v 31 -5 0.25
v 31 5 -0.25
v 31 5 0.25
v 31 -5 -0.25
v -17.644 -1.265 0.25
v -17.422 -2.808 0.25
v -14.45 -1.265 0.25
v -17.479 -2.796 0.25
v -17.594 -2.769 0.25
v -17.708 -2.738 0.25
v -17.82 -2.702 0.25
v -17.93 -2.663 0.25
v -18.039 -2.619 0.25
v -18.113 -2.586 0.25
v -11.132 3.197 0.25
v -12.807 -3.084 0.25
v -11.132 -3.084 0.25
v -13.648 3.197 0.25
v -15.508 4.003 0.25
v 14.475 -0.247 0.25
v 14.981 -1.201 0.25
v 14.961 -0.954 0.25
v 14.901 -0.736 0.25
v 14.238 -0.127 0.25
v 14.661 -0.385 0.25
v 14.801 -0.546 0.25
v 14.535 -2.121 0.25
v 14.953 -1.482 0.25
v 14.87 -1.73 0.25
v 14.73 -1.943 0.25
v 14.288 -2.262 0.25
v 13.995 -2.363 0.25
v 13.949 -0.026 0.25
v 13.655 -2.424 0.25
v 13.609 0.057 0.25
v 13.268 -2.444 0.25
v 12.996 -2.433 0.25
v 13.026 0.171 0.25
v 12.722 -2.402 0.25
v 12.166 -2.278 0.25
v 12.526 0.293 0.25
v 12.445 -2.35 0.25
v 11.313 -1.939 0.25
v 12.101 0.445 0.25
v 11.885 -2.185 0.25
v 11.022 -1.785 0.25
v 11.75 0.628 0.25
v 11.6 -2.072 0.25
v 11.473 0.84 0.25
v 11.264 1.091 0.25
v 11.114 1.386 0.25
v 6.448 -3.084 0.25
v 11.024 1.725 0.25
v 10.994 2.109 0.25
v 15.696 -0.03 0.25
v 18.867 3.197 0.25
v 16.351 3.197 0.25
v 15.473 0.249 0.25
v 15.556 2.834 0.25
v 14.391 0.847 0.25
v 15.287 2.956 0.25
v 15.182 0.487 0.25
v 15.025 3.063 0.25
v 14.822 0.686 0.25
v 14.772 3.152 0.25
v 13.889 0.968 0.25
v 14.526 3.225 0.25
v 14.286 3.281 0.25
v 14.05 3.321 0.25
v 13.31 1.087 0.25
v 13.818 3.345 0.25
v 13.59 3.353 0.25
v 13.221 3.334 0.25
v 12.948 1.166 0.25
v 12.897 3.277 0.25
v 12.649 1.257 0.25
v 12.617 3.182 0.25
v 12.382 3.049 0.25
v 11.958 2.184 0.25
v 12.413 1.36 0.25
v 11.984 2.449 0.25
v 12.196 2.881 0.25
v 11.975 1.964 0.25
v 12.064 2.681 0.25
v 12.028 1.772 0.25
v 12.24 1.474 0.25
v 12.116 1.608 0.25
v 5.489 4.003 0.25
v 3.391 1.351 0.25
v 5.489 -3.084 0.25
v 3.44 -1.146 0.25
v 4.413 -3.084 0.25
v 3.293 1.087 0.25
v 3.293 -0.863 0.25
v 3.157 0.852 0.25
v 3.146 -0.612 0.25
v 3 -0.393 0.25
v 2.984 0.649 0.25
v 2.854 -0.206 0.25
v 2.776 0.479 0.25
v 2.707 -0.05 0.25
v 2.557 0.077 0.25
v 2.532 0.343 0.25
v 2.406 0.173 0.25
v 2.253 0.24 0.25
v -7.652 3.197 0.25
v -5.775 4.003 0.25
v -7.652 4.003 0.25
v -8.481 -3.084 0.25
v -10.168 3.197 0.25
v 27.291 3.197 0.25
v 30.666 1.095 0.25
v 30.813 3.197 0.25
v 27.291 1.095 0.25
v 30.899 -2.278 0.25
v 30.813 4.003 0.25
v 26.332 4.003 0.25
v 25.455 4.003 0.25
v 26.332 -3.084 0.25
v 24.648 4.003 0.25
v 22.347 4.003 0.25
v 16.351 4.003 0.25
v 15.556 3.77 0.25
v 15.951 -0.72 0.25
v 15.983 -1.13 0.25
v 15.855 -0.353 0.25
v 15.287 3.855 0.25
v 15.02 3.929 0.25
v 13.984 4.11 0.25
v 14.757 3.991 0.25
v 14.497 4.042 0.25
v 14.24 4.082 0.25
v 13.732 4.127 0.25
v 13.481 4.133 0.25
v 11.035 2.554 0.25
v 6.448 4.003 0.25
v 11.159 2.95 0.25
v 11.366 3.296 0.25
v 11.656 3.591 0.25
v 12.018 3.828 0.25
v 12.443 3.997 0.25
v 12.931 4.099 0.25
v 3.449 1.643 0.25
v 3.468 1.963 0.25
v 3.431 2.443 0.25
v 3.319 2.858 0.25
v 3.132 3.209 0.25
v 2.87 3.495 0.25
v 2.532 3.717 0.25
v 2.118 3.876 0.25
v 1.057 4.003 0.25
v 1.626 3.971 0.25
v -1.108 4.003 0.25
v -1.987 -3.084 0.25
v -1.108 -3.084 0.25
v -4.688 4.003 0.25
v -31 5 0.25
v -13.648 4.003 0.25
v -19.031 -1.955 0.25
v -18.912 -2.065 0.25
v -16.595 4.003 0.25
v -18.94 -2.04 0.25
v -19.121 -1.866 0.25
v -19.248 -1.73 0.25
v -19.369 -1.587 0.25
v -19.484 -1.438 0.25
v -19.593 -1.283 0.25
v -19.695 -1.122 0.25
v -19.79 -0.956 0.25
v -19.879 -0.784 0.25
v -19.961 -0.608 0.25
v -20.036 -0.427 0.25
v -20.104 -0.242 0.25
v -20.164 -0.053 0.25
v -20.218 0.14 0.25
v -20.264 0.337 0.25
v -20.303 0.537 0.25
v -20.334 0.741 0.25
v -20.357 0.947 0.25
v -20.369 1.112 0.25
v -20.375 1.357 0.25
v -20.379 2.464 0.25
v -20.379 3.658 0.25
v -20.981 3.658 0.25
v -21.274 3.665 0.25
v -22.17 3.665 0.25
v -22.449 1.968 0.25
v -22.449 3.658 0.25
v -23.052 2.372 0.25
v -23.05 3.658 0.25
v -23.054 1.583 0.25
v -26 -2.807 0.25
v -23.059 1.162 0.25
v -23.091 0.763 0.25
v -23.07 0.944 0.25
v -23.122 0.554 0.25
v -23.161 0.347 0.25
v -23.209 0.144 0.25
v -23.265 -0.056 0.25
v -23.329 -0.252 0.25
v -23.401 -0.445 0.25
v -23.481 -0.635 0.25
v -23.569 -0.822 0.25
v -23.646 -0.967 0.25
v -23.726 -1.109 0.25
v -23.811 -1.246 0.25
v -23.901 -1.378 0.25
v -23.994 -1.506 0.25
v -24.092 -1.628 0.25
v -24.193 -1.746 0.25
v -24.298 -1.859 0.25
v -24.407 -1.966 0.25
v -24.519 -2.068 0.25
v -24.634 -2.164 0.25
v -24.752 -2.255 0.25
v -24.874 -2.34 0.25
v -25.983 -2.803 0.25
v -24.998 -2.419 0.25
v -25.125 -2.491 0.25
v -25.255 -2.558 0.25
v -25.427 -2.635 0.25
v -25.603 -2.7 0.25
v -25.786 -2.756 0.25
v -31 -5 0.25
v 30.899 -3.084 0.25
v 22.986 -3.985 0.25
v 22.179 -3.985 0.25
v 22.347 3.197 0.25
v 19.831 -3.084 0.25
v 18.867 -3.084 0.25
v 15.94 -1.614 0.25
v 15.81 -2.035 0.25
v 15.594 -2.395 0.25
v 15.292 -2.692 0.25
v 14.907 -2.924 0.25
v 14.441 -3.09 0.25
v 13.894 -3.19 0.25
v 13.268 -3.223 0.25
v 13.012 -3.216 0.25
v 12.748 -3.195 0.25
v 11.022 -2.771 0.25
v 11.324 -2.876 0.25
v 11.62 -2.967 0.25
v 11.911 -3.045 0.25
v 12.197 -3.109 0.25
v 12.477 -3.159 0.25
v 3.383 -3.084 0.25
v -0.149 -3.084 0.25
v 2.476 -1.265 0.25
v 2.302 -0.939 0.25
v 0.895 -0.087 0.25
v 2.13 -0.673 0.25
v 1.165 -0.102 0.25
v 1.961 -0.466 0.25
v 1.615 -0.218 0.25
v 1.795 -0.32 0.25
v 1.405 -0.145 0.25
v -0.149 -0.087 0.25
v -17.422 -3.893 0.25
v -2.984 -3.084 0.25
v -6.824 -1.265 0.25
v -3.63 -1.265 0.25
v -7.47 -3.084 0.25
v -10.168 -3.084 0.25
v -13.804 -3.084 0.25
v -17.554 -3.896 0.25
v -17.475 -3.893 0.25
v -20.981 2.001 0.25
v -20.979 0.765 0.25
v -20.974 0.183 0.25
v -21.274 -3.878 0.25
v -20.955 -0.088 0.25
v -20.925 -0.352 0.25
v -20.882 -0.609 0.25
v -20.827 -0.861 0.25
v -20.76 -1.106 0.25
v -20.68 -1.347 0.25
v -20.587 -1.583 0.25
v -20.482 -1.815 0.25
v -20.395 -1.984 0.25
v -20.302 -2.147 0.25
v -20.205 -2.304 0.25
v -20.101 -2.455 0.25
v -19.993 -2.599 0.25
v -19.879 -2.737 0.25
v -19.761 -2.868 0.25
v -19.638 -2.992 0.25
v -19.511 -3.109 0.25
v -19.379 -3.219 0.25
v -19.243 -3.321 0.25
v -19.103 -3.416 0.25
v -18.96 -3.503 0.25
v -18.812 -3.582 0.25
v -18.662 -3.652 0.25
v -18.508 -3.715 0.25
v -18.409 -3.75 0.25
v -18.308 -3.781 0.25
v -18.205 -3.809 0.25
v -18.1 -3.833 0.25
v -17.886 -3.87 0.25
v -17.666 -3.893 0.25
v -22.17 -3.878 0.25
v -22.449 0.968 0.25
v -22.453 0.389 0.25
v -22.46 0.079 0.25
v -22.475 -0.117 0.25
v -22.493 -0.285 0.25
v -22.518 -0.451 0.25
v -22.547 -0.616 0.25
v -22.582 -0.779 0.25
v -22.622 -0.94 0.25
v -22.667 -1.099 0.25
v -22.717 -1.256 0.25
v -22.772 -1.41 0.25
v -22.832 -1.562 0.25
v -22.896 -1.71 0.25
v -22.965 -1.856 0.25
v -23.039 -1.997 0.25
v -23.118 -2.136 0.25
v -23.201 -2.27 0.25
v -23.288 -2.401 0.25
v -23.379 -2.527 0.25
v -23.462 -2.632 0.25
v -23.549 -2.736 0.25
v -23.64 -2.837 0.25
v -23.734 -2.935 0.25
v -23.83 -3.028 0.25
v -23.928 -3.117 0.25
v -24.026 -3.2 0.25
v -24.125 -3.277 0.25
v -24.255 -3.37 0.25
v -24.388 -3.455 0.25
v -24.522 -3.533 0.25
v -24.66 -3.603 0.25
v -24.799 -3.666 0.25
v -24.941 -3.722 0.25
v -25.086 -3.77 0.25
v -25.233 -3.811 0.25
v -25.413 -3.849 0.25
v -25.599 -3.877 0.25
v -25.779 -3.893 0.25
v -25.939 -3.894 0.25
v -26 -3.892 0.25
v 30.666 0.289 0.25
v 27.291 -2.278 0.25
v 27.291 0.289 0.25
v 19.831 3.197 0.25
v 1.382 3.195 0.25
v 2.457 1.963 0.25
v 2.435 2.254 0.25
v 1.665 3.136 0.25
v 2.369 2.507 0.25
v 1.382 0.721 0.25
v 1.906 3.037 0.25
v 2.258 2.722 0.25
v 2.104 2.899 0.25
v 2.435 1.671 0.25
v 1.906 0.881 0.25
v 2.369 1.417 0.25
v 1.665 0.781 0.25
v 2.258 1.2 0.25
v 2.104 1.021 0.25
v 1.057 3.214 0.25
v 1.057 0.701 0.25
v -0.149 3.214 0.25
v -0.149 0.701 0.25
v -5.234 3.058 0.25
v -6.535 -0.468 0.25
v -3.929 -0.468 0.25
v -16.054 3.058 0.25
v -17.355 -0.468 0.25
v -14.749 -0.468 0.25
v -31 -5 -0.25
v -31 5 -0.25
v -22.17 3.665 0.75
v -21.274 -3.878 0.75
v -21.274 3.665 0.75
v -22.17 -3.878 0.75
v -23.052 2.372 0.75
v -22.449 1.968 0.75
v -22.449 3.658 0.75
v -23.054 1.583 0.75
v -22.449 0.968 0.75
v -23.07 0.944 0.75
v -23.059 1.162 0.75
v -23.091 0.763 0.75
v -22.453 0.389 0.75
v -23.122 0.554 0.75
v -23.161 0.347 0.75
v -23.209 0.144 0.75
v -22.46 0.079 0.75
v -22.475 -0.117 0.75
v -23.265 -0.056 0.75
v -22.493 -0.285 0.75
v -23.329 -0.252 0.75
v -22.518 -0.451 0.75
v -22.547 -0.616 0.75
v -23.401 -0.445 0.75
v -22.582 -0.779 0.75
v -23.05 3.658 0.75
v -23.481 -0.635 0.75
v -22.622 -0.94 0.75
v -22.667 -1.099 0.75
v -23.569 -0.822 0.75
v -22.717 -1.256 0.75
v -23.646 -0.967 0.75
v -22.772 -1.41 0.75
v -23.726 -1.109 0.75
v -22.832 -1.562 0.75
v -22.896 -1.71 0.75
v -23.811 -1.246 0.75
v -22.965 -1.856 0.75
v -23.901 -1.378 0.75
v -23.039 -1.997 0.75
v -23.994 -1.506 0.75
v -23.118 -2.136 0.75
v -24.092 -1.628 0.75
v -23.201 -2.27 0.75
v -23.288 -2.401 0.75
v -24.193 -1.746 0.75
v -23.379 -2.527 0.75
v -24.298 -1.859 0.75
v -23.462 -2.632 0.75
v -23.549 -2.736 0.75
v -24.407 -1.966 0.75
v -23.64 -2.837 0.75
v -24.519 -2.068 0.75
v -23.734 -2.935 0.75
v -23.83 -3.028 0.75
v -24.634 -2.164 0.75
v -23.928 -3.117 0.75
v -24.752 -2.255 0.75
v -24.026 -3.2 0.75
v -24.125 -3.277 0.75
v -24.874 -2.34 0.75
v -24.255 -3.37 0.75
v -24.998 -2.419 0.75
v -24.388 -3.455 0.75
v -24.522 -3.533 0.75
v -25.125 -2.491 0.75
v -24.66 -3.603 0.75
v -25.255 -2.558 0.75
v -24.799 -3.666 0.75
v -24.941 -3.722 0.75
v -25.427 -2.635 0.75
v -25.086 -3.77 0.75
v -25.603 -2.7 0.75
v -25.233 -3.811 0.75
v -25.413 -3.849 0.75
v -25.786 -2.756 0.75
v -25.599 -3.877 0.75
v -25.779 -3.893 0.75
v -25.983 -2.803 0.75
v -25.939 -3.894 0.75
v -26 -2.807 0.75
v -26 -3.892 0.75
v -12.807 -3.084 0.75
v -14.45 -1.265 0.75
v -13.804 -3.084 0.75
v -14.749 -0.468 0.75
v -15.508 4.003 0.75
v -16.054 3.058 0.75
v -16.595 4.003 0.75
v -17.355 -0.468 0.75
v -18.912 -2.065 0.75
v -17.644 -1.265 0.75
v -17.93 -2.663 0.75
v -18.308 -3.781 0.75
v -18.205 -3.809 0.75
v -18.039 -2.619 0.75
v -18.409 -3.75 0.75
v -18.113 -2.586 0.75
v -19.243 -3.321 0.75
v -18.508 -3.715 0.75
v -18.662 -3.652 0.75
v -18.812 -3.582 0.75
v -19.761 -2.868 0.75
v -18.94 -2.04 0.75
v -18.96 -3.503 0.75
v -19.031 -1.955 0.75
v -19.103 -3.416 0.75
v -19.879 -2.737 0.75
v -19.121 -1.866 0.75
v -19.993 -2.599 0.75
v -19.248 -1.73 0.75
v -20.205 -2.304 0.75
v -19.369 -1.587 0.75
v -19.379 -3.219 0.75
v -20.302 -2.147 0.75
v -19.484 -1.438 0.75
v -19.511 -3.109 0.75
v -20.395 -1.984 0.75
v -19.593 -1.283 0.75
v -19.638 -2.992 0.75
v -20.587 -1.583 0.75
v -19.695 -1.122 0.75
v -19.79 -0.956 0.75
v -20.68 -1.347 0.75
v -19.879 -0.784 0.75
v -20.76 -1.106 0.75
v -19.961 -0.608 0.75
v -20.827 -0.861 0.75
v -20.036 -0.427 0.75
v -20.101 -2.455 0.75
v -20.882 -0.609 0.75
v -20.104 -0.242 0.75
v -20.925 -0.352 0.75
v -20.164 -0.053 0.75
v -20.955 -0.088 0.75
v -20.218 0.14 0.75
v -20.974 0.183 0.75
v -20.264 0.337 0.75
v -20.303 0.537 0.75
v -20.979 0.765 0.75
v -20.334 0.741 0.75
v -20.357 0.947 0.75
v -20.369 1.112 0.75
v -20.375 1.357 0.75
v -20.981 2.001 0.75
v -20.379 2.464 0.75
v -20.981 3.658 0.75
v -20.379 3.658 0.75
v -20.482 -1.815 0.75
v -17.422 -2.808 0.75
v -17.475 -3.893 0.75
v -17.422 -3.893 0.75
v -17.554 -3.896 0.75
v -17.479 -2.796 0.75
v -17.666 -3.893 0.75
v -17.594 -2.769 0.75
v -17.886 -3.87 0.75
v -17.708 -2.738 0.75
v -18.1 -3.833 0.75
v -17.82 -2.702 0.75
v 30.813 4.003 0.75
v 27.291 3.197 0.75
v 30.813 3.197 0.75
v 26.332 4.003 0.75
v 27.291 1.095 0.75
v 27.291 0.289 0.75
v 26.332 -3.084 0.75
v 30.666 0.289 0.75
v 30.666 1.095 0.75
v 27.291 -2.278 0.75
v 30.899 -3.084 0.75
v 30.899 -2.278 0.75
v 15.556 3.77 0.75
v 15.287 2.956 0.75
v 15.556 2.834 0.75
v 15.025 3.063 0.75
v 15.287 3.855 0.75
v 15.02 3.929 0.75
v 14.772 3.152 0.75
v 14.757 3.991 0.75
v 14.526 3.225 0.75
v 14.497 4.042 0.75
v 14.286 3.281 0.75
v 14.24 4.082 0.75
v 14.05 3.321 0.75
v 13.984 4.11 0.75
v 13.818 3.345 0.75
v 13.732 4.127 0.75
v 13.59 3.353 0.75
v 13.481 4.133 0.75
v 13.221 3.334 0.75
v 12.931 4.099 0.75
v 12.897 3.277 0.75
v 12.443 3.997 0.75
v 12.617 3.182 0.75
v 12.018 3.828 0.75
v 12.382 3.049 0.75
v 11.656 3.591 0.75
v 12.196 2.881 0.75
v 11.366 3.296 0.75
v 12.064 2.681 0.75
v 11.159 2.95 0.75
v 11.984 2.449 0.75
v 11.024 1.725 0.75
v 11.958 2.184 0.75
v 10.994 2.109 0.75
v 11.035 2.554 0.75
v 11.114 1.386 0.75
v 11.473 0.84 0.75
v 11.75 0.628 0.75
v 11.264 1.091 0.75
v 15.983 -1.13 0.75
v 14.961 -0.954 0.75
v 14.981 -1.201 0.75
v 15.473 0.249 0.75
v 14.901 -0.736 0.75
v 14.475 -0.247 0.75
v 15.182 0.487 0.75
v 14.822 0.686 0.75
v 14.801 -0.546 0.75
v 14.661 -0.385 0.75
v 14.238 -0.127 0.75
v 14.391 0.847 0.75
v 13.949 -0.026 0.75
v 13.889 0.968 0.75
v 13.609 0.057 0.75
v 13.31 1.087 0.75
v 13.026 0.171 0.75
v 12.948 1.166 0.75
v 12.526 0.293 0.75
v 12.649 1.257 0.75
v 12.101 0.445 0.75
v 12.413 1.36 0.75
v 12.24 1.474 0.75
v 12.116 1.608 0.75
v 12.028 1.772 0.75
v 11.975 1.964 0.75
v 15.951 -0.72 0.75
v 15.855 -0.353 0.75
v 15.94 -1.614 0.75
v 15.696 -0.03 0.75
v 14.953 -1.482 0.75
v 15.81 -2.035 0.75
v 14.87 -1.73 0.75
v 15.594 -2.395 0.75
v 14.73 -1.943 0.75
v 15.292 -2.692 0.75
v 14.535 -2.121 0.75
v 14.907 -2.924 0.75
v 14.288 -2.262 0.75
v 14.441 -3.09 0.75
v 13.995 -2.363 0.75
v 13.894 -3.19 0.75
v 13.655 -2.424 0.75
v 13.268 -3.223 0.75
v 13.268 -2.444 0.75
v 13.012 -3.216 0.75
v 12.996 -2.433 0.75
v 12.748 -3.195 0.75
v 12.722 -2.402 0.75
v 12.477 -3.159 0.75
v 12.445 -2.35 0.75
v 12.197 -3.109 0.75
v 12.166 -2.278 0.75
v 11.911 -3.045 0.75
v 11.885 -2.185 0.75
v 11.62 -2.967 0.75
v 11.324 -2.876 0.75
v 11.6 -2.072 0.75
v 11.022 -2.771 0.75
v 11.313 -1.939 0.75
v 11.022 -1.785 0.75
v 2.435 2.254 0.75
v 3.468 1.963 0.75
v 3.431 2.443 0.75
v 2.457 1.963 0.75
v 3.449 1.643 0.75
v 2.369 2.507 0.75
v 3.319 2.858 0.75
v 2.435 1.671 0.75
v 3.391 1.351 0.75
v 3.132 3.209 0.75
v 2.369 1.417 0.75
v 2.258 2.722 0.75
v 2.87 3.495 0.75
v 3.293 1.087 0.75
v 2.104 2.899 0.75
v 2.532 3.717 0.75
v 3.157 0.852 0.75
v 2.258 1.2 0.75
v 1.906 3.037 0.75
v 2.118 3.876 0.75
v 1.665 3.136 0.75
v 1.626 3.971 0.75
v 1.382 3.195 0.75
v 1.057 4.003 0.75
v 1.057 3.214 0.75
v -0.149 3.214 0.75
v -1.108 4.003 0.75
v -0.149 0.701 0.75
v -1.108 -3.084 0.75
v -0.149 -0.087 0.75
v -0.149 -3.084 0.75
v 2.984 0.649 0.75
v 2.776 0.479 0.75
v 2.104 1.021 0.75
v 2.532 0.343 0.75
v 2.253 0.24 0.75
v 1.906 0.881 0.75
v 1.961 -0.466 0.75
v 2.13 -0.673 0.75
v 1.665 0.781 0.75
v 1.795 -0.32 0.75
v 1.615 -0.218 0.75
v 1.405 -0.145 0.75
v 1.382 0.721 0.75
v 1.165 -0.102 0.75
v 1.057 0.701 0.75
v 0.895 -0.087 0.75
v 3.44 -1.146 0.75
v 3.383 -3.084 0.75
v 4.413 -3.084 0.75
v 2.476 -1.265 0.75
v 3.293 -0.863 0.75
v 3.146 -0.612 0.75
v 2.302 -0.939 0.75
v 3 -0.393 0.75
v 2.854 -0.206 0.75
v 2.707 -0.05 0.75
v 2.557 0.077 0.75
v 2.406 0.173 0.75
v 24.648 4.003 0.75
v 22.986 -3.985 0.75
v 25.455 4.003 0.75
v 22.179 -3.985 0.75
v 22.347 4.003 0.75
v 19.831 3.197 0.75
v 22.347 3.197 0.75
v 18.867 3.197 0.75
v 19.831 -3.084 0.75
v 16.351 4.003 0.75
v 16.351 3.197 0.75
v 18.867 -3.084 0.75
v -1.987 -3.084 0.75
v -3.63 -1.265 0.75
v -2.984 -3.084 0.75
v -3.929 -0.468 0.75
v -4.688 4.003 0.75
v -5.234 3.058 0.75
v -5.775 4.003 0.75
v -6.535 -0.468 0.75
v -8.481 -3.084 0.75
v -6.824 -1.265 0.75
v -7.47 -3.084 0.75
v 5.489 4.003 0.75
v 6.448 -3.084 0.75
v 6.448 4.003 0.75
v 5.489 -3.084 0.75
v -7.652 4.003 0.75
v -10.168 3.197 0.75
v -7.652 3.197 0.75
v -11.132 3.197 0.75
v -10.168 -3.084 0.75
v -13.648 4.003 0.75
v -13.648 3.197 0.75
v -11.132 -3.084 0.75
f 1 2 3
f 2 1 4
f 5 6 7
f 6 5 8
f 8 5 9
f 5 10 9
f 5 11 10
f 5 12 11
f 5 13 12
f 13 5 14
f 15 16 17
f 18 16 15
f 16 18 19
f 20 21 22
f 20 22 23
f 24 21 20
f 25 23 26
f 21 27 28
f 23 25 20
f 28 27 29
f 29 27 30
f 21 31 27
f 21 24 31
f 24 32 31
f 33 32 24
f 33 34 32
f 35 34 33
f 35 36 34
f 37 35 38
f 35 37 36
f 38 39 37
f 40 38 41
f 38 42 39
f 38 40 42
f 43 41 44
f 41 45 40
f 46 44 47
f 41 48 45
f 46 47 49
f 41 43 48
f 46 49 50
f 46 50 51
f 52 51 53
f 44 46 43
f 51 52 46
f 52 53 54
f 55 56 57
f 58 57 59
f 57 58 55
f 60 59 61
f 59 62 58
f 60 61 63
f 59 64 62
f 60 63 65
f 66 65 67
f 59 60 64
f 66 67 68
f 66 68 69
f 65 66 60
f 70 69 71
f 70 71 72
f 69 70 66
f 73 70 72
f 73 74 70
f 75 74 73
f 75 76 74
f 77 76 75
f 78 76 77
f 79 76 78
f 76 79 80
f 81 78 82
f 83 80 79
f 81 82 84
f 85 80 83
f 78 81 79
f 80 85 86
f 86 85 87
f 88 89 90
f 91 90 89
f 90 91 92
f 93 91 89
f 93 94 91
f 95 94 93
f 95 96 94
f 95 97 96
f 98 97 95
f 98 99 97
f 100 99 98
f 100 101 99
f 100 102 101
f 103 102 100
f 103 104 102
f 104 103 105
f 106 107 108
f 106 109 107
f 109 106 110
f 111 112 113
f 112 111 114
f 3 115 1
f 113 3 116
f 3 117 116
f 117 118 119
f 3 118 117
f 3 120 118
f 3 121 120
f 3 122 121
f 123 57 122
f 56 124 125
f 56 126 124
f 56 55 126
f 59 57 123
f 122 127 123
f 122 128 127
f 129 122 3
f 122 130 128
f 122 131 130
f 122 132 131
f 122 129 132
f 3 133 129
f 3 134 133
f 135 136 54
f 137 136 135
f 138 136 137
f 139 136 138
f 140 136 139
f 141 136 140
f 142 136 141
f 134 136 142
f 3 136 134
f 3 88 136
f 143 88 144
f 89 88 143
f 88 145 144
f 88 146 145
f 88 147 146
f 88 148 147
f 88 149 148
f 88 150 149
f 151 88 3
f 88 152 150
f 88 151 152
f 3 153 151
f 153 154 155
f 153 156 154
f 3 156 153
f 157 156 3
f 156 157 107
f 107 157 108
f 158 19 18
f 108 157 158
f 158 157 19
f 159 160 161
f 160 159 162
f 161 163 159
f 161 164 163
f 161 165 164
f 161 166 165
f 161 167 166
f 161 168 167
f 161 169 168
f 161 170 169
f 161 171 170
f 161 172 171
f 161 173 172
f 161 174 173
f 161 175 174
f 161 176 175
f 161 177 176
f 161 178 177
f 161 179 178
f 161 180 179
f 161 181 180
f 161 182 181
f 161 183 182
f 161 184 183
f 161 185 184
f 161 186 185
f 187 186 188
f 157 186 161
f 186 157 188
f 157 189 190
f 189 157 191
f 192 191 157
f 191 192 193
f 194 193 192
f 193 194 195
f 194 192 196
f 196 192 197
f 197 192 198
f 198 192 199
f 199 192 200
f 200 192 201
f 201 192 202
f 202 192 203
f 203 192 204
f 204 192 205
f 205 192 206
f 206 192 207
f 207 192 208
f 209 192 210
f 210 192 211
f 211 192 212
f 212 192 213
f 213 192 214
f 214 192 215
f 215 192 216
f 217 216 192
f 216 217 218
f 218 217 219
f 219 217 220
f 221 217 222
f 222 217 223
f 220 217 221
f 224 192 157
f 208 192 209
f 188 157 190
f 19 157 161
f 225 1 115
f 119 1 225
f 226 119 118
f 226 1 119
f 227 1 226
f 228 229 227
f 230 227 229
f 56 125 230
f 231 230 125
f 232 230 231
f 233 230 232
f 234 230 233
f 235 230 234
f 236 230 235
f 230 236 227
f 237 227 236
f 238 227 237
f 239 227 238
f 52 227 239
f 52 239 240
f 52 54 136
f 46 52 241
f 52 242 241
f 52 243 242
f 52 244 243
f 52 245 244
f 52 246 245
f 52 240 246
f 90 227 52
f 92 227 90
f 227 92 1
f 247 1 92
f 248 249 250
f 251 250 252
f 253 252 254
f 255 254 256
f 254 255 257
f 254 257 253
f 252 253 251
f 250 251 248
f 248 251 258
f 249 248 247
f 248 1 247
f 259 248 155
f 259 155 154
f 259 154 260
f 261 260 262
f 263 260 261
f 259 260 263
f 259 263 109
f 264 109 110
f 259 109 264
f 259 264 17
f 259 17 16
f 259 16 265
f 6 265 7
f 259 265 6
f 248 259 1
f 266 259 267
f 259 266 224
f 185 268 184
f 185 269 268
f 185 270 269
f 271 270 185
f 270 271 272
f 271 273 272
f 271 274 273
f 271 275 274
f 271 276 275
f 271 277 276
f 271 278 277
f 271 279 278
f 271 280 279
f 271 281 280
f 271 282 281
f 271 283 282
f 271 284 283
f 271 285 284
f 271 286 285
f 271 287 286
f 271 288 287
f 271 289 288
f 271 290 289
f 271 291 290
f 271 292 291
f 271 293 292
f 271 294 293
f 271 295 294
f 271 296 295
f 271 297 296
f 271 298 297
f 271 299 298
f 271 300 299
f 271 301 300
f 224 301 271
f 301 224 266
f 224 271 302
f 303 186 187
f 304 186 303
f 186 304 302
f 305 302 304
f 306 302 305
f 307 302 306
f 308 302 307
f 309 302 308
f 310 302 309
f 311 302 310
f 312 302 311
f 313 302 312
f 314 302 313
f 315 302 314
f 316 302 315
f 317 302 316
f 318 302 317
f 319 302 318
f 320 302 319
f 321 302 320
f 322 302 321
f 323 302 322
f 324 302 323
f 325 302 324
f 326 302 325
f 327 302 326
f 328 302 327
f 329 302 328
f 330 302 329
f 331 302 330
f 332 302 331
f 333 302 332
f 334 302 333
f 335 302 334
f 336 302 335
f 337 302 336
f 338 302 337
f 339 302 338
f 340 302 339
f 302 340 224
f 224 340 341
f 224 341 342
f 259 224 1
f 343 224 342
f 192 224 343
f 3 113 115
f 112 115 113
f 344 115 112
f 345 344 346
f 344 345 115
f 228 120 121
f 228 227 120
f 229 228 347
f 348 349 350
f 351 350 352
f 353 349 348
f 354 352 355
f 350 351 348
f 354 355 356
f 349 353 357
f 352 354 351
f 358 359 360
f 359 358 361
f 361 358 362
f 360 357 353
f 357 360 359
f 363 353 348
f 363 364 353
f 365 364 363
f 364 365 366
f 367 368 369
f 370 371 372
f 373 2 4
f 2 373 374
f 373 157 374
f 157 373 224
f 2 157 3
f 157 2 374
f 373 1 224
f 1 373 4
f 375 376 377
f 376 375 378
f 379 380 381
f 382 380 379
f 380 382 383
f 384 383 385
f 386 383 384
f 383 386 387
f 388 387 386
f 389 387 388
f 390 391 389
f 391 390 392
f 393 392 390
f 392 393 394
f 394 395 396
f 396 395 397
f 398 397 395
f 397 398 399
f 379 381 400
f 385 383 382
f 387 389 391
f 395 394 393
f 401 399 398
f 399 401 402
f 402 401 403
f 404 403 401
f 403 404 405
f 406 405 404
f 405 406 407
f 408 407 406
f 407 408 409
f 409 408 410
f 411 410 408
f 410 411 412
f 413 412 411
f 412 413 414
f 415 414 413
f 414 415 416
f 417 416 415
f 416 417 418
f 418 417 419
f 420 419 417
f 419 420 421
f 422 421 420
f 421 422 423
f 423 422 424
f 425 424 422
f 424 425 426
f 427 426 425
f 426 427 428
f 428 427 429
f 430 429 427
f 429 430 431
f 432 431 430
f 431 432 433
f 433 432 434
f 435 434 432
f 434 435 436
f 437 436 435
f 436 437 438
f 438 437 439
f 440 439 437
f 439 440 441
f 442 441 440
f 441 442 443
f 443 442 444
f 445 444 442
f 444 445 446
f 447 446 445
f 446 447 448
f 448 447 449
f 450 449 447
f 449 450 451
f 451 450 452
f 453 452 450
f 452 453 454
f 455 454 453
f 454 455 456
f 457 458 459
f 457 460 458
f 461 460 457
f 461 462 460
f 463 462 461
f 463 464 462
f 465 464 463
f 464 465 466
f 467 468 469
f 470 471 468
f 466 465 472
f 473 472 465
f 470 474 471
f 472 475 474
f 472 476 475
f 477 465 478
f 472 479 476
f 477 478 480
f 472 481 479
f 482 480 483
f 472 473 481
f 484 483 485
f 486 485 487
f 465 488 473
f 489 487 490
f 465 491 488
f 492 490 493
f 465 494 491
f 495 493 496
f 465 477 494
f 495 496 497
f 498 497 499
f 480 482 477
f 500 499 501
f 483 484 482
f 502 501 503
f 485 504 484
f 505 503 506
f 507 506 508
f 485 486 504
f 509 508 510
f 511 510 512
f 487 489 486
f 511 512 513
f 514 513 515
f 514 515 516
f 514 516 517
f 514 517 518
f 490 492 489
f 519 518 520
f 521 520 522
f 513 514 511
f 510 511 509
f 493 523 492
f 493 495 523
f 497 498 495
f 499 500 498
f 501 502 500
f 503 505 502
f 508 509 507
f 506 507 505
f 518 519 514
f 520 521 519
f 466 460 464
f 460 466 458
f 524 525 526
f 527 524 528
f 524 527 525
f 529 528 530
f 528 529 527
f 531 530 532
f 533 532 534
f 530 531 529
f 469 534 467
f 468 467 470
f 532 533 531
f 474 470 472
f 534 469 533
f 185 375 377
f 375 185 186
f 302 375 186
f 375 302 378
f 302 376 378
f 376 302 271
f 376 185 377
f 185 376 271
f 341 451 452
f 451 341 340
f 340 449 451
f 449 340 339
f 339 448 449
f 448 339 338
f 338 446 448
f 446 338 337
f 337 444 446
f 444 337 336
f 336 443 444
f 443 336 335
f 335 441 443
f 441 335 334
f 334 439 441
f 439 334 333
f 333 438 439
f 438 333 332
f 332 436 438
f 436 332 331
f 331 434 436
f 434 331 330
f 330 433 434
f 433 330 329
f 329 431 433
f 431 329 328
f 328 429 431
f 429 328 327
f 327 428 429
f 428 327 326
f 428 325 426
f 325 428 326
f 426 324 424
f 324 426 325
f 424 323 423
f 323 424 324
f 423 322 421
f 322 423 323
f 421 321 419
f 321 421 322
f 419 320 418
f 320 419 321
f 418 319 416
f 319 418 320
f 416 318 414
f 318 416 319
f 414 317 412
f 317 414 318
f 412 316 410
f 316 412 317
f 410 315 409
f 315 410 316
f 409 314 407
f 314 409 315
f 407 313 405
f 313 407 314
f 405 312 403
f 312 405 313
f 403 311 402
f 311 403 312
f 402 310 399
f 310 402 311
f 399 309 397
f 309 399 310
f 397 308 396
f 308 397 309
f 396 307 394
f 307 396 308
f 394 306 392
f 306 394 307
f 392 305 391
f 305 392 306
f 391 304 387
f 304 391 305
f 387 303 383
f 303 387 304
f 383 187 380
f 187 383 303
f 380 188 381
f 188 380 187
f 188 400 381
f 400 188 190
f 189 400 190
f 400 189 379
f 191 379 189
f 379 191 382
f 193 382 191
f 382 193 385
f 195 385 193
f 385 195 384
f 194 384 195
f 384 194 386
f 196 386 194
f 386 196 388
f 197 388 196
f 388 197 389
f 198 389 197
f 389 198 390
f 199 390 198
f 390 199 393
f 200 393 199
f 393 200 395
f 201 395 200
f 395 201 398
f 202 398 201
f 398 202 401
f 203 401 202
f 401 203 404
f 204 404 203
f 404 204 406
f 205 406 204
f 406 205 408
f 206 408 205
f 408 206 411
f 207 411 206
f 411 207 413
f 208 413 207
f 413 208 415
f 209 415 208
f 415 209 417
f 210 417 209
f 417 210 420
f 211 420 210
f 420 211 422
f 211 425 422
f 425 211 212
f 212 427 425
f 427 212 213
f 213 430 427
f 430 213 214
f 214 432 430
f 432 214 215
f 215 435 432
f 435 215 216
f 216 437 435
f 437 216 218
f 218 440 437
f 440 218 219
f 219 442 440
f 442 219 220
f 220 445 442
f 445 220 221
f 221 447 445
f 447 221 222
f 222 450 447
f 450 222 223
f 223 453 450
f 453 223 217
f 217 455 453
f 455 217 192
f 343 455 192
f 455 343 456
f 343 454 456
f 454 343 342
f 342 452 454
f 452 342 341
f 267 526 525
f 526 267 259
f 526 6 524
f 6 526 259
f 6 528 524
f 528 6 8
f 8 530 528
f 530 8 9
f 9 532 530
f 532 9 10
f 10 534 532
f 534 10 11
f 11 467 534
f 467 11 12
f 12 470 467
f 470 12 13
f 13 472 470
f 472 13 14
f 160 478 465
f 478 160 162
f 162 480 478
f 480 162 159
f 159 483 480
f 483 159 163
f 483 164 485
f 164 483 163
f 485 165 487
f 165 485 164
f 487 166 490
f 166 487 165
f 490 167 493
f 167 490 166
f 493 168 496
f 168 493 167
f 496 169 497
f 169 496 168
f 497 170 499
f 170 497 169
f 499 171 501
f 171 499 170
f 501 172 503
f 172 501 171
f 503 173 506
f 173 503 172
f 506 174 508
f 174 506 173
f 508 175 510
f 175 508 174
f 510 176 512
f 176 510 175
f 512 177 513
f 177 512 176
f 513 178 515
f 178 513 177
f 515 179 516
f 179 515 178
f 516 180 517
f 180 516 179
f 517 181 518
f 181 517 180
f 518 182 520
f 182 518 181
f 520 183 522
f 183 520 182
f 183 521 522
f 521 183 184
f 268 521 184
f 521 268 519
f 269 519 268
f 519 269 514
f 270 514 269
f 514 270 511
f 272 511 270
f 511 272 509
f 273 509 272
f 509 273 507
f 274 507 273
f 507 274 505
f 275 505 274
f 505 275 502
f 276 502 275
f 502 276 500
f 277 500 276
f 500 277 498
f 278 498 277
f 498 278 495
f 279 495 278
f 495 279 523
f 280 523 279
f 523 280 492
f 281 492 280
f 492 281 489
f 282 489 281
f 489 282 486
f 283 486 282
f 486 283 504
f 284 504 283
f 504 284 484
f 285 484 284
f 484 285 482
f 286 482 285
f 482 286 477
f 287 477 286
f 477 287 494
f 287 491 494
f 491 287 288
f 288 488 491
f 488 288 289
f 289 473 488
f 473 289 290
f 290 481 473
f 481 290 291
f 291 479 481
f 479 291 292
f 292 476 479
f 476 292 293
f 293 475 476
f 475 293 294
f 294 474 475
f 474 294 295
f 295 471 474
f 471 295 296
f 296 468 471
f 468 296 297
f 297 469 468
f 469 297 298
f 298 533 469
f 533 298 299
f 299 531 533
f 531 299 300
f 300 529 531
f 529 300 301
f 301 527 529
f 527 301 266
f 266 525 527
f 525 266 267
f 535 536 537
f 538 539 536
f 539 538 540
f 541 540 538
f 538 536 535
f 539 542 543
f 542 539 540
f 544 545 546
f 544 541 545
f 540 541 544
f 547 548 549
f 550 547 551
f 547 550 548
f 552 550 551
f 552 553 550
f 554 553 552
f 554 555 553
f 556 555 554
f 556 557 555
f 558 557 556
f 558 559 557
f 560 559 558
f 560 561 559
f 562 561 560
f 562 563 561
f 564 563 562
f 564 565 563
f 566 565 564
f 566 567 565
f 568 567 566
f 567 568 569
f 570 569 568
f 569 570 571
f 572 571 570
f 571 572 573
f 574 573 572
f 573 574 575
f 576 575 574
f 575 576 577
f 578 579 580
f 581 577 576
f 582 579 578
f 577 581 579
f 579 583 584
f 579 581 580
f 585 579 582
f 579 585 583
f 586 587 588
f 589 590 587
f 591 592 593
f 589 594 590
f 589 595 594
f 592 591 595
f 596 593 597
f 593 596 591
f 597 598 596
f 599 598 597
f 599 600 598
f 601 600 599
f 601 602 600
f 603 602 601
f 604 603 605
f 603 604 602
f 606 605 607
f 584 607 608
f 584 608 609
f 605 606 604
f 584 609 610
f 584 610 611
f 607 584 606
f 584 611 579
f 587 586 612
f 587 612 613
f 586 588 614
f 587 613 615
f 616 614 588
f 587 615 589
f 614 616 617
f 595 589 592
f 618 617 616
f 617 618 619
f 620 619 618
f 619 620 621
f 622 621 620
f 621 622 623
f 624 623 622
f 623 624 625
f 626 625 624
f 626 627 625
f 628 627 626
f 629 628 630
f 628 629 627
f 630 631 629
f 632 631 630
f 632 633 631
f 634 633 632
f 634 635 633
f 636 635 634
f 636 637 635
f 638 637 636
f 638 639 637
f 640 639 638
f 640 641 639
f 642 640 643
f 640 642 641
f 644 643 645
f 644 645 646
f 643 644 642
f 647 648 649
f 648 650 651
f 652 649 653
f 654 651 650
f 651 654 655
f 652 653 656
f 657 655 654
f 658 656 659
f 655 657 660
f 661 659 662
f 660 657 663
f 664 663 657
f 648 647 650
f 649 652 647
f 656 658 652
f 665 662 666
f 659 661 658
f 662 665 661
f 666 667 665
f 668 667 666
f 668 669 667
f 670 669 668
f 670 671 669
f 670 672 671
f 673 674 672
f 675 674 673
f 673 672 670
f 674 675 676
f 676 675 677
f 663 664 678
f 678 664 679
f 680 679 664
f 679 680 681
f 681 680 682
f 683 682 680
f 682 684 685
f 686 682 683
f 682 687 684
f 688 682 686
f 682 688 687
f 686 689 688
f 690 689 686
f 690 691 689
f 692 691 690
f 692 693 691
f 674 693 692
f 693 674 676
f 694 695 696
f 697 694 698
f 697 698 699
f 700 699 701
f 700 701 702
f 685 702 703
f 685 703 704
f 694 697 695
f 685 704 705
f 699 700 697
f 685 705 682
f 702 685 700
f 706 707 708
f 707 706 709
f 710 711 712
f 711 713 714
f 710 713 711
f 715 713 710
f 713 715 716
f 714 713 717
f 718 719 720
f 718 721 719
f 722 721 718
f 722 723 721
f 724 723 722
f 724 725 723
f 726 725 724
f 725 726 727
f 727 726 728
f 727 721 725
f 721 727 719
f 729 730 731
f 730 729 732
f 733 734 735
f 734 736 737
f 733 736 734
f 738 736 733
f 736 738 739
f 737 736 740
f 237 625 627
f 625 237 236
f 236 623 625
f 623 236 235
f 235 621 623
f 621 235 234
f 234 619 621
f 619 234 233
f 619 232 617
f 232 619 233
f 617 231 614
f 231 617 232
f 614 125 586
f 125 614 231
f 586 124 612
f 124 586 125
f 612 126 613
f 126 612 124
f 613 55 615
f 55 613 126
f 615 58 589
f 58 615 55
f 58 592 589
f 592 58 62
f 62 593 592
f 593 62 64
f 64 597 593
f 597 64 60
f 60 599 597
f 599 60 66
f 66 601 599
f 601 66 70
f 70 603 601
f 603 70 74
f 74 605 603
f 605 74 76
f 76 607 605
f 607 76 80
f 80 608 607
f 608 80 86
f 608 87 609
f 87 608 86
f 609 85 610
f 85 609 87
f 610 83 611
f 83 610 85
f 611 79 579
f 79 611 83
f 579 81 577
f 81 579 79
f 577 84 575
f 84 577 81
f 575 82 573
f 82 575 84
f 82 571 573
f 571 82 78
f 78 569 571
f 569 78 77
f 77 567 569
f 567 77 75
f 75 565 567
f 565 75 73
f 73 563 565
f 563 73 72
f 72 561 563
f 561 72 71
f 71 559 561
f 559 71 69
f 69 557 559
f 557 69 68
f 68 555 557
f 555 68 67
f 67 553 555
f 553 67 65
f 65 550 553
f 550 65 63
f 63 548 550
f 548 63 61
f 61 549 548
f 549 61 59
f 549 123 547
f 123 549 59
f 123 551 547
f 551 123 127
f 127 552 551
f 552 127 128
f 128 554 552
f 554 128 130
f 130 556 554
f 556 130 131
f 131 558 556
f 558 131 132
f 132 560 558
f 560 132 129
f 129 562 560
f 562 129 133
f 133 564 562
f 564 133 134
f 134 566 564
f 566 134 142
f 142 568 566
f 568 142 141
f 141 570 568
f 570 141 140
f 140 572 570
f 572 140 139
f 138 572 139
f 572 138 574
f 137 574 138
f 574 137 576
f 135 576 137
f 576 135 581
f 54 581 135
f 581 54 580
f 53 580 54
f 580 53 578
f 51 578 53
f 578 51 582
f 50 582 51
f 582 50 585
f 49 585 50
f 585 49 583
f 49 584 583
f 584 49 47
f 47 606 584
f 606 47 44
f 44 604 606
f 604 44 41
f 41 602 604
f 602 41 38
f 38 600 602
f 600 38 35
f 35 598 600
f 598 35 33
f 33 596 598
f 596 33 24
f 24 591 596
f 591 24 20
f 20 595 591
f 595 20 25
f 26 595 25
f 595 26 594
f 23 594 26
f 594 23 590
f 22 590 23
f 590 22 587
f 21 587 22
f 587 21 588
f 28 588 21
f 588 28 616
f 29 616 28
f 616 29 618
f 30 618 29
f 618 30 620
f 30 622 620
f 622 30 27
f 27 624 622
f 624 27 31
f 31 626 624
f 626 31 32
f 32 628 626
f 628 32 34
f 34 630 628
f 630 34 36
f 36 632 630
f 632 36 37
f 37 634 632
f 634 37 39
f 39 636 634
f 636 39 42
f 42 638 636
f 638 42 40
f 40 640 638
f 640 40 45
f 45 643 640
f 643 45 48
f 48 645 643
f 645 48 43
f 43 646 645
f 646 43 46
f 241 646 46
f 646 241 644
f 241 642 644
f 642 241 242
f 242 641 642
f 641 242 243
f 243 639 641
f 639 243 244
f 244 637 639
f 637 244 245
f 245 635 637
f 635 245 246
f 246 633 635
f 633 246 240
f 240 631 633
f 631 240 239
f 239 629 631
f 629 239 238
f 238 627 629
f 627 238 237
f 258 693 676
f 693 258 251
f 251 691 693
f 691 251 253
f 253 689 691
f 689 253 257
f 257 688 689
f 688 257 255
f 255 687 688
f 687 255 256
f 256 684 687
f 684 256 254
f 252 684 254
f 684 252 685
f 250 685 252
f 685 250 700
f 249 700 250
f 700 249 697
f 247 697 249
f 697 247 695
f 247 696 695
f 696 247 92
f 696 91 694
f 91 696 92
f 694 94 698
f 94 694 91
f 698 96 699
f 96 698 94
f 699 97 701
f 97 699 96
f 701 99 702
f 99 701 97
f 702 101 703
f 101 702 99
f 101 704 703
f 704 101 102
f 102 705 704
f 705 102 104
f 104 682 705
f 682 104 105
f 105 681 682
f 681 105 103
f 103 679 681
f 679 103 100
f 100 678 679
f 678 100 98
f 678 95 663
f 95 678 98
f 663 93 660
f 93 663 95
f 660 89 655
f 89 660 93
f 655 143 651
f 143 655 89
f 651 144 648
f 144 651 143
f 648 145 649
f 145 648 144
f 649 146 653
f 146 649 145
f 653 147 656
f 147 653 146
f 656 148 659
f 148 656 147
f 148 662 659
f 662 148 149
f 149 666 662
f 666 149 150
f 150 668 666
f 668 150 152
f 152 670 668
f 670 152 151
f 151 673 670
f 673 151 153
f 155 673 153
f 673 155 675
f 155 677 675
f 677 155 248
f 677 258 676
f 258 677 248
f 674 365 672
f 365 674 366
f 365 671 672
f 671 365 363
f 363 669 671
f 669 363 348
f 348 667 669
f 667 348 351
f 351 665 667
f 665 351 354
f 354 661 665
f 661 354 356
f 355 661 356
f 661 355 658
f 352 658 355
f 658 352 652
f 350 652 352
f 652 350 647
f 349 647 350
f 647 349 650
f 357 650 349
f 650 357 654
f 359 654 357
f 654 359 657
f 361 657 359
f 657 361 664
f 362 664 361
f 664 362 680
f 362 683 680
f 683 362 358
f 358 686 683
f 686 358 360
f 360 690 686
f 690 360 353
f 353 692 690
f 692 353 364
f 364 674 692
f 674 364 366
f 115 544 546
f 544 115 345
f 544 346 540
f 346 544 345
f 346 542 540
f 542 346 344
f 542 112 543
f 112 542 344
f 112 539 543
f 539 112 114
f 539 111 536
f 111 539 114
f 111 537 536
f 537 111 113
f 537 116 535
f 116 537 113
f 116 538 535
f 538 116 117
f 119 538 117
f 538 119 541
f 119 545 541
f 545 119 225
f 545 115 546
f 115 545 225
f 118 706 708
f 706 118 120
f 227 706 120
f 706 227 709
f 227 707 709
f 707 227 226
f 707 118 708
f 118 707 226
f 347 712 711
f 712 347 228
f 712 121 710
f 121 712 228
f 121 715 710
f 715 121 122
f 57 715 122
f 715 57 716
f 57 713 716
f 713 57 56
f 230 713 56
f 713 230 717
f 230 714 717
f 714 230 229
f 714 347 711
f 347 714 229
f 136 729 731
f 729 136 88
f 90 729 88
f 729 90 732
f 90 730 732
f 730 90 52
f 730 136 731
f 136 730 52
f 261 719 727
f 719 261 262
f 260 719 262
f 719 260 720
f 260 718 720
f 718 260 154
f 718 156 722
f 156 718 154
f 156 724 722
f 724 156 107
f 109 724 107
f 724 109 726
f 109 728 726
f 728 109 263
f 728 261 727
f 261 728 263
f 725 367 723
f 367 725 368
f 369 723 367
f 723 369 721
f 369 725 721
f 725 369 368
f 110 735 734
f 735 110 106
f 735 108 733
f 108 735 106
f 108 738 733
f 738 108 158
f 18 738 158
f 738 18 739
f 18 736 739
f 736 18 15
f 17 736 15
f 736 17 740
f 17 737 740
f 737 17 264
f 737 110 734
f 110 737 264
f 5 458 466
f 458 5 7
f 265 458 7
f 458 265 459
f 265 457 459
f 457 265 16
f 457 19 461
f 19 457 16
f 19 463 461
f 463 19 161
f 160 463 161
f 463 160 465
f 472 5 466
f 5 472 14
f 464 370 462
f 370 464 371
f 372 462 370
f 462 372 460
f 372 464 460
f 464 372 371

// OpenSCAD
// A simple case for the MiSTeryNano Lite  (https://github.com/harbaum/MiSTeryNano)

// Original author: Oliver Jaksch
// CC BY-NC-SA 4.0 (https://creativecommons.org/licenses/by-nc-sa/4.0/)

// The used "Atari-Font" is copyrighted but "Free for Personal Use"
// https://befonts.com/rawles.charmap

// The Badge

font = "Rawles"; // Must be installed in your system and named correctly!
letter_size = 7;
letter_height = 0.5;
holediameter = 8;

module letter(l) {
    // Use linear_extrude() to make the letters 3D objects as they
    // are only 2D shapes when only using text()
    linear_extrude(height = letter_height) {
        text(l, size = letter_size, font = font, halign = "center", valign = "center", $fn = 25);
    }
}

// Base Plate
color("PaleGreen") cube([62, 10, 0.5], true);

// Atari Logo
translate([-26, -3.9, 0.25]) scale([0.026, 0.026, 1])
linear_extrude(height = 0.5)
import("logos/fuji2.dxf");

// Text
translate([6, 0, 0.25]) letter("ATARI ST/E");
